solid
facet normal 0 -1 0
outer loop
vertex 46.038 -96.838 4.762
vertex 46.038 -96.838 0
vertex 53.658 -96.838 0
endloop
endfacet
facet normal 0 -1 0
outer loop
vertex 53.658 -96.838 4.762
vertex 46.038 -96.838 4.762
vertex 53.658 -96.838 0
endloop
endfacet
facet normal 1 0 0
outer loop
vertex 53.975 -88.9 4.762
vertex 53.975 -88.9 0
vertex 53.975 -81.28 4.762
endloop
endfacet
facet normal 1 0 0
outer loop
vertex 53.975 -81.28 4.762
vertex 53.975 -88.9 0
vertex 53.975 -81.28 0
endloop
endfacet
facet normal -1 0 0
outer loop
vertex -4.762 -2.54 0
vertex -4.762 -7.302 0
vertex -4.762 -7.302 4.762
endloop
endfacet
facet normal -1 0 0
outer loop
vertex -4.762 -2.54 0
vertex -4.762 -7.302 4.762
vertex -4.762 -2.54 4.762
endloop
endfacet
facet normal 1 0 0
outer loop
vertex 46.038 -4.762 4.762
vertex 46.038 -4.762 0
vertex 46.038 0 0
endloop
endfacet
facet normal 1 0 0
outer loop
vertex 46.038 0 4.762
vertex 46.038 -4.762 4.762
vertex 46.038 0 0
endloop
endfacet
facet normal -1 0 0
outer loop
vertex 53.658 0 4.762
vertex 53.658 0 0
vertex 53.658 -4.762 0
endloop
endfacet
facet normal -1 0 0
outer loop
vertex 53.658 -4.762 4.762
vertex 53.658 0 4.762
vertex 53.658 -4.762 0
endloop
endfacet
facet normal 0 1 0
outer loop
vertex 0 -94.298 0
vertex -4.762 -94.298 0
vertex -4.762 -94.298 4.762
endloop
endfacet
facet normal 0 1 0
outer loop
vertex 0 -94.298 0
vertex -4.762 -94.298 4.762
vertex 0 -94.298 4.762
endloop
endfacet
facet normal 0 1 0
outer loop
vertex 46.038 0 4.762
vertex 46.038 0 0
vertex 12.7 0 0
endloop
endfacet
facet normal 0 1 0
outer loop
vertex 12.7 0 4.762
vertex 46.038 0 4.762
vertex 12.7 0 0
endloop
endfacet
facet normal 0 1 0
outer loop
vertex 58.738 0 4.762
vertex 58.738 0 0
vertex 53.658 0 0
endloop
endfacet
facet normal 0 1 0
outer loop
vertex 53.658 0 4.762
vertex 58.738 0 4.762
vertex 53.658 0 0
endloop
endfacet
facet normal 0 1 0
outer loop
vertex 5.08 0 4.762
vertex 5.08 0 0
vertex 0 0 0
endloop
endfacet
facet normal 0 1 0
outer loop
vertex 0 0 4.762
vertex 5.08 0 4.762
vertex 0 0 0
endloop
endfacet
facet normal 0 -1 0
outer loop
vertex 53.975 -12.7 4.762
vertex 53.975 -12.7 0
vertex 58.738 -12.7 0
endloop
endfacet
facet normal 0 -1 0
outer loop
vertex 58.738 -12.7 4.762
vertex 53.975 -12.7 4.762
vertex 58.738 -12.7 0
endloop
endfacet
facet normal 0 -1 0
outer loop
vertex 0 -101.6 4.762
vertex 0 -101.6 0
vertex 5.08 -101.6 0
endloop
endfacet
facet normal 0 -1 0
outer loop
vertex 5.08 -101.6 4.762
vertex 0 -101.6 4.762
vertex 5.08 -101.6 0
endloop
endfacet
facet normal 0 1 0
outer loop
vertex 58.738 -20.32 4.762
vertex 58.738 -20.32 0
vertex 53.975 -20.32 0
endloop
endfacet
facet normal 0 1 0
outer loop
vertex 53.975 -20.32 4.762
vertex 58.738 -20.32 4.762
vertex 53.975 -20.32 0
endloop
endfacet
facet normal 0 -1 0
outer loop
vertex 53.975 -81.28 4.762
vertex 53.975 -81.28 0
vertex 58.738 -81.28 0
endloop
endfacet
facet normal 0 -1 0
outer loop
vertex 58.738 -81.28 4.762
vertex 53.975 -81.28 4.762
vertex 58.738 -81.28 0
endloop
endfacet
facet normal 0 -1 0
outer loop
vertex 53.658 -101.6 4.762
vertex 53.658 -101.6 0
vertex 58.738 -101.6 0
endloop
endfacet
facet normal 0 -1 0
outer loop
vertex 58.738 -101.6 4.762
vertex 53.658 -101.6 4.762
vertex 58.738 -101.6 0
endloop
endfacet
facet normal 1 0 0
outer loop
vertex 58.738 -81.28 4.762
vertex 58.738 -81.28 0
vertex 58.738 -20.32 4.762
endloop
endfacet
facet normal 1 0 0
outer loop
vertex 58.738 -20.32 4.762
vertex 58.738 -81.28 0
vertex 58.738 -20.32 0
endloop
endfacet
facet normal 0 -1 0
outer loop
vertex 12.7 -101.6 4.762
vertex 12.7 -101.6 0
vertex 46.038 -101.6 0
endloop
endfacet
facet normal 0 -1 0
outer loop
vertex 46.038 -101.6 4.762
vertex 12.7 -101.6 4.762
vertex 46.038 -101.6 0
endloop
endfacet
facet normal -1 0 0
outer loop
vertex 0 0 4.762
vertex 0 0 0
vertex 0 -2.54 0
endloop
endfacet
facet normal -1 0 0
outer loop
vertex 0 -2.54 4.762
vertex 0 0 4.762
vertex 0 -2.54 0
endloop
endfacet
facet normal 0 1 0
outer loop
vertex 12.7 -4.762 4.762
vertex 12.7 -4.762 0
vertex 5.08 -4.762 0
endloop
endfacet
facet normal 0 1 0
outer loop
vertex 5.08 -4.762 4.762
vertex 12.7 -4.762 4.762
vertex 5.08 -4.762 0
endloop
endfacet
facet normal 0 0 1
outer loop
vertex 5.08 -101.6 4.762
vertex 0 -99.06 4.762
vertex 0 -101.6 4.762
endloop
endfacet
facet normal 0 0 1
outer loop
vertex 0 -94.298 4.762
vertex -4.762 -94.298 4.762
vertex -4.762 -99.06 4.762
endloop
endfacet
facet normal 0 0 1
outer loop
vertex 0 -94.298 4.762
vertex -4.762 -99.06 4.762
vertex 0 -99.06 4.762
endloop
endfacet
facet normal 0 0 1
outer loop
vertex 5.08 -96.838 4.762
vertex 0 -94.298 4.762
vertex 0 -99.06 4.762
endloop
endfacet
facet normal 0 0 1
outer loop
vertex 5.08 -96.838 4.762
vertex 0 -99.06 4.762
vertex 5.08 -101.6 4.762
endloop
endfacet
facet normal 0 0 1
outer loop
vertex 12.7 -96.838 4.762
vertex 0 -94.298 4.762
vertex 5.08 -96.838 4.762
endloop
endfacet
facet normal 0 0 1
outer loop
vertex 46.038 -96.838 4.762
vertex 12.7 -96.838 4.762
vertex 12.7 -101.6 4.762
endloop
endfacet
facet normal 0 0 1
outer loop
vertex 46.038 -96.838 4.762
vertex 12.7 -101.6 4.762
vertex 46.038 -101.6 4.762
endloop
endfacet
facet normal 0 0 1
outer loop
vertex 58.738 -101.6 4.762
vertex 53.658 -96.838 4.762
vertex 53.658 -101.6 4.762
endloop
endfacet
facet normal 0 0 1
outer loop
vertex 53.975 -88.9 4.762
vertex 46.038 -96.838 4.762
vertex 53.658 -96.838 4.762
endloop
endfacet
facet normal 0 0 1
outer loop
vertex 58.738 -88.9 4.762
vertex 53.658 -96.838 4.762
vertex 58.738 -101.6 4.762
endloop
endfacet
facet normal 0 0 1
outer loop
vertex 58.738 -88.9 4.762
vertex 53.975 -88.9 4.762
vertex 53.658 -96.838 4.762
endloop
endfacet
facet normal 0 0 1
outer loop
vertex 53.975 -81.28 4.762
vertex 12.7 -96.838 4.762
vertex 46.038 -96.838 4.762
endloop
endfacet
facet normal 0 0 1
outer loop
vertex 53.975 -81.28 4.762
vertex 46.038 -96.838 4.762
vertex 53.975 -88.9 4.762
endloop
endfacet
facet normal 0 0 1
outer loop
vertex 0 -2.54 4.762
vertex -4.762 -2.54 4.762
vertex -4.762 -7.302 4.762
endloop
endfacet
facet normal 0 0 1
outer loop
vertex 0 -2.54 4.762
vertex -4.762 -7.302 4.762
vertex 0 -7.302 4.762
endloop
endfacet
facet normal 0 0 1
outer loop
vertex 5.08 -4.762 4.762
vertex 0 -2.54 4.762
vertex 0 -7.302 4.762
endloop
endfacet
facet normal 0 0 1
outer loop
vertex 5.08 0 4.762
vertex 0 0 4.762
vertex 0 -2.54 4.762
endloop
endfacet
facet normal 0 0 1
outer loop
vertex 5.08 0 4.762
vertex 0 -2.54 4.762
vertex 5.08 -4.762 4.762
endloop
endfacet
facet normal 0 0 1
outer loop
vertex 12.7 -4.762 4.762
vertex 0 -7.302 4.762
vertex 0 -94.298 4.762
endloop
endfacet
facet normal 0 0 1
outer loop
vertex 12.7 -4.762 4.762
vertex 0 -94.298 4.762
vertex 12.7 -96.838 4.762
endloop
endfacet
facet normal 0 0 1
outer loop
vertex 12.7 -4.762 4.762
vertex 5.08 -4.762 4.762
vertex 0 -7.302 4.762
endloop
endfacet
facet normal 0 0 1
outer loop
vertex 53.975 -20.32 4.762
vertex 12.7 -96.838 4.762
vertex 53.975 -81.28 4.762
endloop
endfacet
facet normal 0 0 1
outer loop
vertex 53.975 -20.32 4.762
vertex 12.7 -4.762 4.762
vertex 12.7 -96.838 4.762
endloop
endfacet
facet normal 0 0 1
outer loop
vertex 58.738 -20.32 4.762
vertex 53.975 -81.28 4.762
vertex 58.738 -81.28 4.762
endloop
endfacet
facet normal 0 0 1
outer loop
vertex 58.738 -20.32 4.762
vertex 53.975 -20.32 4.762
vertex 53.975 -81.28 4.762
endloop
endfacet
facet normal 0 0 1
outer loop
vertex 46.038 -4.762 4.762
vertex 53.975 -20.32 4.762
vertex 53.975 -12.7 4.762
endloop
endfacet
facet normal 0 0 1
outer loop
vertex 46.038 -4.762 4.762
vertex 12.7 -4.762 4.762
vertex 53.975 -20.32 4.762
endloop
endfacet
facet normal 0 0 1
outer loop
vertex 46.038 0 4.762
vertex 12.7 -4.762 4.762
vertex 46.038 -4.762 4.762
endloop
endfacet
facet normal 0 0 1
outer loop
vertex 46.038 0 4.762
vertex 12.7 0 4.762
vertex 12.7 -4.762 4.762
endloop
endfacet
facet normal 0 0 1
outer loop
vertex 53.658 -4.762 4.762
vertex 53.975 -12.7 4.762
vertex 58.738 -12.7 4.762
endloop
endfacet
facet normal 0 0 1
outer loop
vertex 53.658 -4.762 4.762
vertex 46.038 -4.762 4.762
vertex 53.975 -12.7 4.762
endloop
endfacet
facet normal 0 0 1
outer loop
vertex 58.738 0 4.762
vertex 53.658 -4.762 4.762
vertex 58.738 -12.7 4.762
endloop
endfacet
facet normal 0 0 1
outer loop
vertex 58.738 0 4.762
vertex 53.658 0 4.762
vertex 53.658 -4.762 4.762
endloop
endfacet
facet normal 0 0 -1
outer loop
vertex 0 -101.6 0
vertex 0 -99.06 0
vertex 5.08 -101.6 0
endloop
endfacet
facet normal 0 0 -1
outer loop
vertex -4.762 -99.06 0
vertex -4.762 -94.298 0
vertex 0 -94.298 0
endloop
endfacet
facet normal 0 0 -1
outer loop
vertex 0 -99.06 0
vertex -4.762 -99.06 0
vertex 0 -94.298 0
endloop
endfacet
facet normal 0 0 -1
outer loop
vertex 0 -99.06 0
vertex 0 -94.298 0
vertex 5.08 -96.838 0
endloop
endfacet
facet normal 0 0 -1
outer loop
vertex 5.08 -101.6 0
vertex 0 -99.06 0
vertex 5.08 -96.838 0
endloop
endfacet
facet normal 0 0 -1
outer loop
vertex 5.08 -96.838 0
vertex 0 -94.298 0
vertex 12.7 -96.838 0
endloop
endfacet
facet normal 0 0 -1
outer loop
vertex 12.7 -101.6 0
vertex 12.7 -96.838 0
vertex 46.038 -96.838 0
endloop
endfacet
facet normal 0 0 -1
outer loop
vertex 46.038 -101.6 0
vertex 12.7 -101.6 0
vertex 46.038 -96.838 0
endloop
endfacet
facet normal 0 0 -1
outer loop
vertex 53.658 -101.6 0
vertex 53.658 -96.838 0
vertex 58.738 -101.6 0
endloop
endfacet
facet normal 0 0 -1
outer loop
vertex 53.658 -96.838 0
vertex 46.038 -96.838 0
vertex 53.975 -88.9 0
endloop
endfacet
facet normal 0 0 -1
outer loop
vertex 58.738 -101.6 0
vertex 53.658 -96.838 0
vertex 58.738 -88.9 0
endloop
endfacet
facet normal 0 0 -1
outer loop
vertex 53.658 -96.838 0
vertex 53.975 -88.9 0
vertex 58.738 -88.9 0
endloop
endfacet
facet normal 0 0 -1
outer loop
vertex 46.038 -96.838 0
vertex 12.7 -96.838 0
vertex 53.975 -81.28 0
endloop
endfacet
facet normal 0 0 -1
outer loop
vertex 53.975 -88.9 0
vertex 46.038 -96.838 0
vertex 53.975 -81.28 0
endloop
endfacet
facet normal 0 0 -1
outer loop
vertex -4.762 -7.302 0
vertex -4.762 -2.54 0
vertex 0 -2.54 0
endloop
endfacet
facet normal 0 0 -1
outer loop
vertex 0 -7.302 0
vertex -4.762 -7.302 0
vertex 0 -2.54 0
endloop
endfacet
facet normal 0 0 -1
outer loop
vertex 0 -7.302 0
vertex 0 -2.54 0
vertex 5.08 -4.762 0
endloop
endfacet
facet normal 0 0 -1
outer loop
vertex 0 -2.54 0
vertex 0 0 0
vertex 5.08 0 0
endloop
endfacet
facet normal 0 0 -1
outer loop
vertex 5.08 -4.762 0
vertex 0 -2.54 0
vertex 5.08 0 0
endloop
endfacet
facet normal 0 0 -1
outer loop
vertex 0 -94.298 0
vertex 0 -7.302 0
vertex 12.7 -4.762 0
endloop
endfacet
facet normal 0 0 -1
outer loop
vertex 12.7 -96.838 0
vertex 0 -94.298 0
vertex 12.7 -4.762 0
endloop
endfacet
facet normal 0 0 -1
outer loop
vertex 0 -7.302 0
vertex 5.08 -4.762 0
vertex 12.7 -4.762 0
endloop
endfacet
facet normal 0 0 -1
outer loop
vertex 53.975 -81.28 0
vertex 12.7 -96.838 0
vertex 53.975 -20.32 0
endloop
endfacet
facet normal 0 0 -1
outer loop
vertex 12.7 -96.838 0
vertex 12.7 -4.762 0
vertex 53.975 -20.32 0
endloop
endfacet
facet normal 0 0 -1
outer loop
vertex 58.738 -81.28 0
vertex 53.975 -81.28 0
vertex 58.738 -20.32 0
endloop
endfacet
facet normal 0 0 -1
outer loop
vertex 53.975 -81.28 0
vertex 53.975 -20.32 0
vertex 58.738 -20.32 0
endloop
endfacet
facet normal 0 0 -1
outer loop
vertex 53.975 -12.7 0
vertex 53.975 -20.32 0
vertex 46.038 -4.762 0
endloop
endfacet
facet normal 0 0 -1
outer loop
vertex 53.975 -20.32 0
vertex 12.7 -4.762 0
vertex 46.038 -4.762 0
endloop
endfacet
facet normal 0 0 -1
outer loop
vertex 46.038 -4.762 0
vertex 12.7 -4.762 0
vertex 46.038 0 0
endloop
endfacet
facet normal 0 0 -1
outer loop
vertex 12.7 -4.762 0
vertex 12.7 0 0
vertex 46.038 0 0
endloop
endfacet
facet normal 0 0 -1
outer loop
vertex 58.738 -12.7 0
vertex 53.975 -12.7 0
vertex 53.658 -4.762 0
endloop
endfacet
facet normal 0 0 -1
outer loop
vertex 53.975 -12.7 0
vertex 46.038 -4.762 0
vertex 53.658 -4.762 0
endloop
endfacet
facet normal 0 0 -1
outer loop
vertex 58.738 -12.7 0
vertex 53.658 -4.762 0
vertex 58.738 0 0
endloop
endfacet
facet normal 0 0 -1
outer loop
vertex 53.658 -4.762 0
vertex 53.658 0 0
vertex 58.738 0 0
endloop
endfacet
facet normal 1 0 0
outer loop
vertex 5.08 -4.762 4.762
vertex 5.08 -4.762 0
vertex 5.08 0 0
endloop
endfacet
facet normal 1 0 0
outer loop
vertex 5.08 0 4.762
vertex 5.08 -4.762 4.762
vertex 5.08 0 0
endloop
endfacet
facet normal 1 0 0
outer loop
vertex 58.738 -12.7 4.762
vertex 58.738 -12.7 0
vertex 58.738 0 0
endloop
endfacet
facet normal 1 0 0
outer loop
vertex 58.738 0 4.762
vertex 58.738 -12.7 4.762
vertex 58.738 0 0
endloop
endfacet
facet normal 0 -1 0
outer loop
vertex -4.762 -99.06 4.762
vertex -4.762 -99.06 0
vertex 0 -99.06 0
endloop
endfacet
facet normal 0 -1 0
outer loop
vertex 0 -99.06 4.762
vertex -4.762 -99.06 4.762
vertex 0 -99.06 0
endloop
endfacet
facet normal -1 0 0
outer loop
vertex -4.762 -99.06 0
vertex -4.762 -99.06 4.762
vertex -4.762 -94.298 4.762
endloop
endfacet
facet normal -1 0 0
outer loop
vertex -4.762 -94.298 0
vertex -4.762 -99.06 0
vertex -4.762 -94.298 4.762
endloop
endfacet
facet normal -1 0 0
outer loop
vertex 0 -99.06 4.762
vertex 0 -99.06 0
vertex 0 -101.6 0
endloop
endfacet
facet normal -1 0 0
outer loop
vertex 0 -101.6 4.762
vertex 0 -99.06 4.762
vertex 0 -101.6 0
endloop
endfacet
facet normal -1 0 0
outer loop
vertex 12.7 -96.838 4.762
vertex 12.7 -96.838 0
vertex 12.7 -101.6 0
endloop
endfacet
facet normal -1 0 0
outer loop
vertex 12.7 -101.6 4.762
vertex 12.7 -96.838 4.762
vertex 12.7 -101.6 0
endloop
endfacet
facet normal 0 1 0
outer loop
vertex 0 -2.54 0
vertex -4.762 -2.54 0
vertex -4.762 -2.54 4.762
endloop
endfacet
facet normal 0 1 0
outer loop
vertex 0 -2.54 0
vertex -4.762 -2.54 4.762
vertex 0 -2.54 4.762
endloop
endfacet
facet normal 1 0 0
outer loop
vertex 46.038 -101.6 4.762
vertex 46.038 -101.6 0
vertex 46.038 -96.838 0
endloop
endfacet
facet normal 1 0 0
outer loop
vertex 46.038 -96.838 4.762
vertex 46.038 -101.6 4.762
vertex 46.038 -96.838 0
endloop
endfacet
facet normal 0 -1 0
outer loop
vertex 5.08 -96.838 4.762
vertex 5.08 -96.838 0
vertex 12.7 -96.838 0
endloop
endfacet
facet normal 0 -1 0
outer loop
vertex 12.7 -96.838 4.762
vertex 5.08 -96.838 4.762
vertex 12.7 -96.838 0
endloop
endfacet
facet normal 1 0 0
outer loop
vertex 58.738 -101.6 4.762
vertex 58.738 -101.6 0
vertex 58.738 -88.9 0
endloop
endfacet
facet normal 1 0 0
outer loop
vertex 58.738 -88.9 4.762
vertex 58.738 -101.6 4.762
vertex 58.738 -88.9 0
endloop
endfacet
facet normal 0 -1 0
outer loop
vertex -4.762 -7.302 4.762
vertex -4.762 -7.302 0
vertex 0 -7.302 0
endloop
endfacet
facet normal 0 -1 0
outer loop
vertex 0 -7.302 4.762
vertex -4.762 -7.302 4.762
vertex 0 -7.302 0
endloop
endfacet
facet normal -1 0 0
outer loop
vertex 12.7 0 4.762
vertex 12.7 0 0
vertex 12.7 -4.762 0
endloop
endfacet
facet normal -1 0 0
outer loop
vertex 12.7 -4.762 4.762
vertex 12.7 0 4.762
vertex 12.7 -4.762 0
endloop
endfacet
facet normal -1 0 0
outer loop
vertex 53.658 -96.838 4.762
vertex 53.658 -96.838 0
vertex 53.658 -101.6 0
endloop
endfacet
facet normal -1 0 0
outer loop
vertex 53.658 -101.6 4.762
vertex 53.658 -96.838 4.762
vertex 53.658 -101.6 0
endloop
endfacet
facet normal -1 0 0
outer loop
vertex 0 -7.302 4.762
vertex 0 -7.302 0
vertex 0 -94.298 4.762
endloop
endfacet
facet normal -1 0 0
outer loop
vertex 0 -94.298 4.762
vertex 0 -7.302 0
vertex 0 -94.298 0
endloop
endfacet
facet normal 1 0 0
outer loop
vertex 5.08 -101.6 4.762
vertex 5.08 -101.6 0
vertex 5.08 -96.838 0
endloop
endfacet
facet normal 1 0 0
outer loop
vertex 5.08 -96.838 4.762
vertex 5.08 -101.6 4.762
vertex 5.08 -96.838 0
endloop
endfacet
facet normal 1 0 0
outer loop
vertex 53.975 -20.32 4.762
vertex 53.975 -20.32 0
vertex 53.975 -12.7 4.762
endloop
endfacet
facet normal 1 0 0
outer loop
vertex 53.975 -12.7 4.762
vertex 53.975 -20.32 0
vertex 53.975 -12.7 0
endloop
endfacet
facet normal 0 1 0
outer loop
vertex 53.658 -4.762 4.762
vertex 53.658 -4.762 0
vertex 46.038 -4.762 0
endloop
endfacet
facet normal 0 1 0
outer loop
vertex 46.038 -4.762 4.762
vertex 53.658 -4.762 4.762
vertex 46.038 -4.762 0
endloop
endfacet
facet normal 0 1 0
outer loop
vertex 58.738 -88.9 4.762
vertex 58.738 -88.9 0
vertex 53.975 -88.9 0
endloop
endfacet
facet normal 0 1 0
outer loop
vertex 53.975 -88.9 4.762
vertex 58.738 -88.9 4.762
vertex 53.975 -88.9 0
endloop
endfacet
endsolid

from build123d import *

# Parameters (mm, degrees)
SKETCH2_W           = 4.7625
SKETCH2_H           = 4.7625
BOSS_EXTRUDE1_DEPTH = 4.7625


with BuildPart() as part:
    # Sketch2 → Boss-Extrude1 (new body)
    with BuildSketch(Plane.XY):
        with Locations((-2.38125, -96.67875)):
            Rectangle(SKETCH2_W, SKETCH2_H)
        with Locations((-2.38125, -4.92125)):
            Rectangle(SKETCH2_W, SKETCH2_H)
        Polygon((5.08, 0), (0, 0), (0, -2.54), (0, -7.3025), (0, -94.2975), (0, -99.06), (0, -101.6), (5.08, -101.6), (5.08, -96.8375), (12.7, -96.8375), (12.7, -101.6), (46.0375, -101.6), (46.0375, -96.8375), (53.6575, -96.8375), (53.6575, -101.6), (58.7375, -101.6), (58.7375, -88.9), (53.975, -88.9), (53.975, -81.28), (58.7375, -81.28), (58.7375, -20.32), (53.975, -20.32), (53.975, -12.7), (58.7375, -12.7), (58.7375, 0), (53.6575, 0), (53.6575, -4.7625), (46.0375, -4.7625), (46.0375, 0), (12.7, 0), (12.7, -4.7625), (5.08, -4.7625), align=None)
    extrude(amount=BOSS_EXTRUDE1_DEPTH)


solid = part.part
